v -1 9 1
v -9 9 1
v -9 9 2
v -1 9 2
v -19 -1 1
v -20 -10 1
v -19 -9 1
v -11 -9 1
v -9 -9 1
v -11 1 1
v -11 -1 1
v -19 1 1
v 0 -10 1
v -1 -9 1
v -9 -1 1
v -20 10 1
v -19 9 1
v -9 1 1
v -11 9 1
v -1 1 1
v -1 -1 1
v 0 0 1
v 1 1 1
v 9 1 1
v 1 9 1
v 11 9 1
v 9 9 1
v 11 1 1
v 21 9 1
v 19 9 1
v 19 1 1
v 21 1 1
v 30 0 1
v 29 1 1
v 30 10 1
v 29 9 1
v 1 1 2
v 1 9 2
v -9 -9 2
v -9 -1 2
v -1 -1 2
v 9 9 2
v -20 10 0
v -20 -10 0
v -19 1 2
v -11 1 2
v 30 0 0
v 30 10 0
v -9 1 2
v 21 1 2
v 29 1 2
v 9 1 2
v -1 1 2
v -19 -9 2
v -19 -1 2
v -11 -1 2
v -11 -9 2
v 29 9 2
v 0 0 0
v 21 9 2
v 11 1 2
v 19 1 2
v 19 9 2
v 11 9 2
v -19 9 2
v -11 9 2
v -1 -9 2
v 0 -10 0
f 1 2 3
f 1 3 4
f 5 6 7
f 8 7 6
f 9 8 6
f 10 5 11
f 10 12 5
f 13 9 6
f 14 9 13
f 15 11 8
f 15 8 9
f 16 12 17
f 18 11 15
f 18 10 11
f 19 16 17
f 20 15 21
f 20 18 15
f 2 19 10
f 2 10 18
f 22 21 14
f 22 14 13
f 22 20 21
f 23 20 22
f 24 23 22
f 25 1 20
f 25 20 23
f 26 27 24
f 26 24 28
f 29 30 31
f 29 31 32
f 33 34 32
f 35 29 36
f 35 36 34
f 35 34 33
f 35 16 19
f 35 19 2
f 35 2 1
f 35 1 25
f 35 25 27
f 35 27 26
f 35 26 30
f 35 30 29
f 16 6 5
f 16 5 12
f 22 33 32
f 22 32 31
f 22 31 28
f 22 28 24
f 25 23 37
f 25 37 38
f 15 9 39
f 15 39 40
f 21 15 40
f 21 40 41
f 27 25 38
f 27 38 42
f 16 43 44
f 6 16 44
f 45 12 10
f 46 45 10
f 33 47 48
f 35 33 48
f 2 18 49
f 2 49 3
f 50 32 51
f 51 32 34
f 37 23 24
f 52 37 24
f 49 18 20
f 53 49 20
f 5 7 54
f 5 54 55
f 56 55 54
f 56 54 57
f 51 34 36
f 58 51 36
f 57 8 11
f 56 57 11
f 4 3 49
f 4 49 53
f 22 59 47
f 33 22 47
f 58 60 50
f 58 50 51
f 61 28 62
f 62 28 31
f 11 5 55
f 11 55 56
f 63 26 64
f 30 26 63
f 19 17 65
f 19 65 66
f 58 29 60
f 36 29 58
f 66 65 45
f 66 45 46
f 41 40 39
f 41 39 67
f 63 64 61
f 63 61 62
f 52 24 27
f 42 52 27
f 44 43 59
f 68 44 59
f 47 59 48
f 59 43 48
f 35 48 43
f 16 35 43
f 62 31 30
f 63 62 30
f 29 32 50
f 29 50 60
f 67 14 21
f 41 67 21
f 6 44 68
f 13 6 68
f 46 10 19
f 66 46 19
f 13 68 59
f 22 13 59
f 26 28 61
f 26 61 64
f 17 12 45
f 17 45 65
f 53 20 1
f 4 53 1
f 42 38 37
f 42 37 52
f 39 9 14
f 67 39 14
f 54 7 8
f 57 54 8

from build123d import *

# Parameters (mm, degrees)
F1_DEPTH = 1
F2_W     = 8
F2_H     = 8
F3_DEPTH = 1


# Not quite as in the source:
# - a feature names something its author has since deleted; it is built from what else it names


with BuildPart() as f1:
    # F0 (on Top) → F1 (new body)
    with BuildSketch(Plane.XY):
        Polygon((30, 10), (-20, 10), (-20, -10), (0, -10), (0, 0), (30, 0), align=None)
    extrude(amount=F1_DEPTH)

    # F2 (on face) → F3 (join)
    with BuildSketch(Plane.XY.offset(1)):
        with Locations((-15, 5)):
            Rectangle(F2_W, F2_H)
        with Locations((-15, -5)):
            Rectangle(F2_W, F2_H)
        with Locations((-5, -5)):
            Rectangle(F2_W, F2_H)
        with Locations((-5, 5)):
            Rectangle(F2_W, F2_H)
        with Locations((5, 5)):
            Rectangle(F2_W, F2_H)
        with Locations((15, 5)):
            Rectangle(F2_W, F2_H)
        with Locations((25, 5)):
            Rectangle(F2_W, F2_H)
    extrude(amount=F3_DEPTH)


solid = f1.part
